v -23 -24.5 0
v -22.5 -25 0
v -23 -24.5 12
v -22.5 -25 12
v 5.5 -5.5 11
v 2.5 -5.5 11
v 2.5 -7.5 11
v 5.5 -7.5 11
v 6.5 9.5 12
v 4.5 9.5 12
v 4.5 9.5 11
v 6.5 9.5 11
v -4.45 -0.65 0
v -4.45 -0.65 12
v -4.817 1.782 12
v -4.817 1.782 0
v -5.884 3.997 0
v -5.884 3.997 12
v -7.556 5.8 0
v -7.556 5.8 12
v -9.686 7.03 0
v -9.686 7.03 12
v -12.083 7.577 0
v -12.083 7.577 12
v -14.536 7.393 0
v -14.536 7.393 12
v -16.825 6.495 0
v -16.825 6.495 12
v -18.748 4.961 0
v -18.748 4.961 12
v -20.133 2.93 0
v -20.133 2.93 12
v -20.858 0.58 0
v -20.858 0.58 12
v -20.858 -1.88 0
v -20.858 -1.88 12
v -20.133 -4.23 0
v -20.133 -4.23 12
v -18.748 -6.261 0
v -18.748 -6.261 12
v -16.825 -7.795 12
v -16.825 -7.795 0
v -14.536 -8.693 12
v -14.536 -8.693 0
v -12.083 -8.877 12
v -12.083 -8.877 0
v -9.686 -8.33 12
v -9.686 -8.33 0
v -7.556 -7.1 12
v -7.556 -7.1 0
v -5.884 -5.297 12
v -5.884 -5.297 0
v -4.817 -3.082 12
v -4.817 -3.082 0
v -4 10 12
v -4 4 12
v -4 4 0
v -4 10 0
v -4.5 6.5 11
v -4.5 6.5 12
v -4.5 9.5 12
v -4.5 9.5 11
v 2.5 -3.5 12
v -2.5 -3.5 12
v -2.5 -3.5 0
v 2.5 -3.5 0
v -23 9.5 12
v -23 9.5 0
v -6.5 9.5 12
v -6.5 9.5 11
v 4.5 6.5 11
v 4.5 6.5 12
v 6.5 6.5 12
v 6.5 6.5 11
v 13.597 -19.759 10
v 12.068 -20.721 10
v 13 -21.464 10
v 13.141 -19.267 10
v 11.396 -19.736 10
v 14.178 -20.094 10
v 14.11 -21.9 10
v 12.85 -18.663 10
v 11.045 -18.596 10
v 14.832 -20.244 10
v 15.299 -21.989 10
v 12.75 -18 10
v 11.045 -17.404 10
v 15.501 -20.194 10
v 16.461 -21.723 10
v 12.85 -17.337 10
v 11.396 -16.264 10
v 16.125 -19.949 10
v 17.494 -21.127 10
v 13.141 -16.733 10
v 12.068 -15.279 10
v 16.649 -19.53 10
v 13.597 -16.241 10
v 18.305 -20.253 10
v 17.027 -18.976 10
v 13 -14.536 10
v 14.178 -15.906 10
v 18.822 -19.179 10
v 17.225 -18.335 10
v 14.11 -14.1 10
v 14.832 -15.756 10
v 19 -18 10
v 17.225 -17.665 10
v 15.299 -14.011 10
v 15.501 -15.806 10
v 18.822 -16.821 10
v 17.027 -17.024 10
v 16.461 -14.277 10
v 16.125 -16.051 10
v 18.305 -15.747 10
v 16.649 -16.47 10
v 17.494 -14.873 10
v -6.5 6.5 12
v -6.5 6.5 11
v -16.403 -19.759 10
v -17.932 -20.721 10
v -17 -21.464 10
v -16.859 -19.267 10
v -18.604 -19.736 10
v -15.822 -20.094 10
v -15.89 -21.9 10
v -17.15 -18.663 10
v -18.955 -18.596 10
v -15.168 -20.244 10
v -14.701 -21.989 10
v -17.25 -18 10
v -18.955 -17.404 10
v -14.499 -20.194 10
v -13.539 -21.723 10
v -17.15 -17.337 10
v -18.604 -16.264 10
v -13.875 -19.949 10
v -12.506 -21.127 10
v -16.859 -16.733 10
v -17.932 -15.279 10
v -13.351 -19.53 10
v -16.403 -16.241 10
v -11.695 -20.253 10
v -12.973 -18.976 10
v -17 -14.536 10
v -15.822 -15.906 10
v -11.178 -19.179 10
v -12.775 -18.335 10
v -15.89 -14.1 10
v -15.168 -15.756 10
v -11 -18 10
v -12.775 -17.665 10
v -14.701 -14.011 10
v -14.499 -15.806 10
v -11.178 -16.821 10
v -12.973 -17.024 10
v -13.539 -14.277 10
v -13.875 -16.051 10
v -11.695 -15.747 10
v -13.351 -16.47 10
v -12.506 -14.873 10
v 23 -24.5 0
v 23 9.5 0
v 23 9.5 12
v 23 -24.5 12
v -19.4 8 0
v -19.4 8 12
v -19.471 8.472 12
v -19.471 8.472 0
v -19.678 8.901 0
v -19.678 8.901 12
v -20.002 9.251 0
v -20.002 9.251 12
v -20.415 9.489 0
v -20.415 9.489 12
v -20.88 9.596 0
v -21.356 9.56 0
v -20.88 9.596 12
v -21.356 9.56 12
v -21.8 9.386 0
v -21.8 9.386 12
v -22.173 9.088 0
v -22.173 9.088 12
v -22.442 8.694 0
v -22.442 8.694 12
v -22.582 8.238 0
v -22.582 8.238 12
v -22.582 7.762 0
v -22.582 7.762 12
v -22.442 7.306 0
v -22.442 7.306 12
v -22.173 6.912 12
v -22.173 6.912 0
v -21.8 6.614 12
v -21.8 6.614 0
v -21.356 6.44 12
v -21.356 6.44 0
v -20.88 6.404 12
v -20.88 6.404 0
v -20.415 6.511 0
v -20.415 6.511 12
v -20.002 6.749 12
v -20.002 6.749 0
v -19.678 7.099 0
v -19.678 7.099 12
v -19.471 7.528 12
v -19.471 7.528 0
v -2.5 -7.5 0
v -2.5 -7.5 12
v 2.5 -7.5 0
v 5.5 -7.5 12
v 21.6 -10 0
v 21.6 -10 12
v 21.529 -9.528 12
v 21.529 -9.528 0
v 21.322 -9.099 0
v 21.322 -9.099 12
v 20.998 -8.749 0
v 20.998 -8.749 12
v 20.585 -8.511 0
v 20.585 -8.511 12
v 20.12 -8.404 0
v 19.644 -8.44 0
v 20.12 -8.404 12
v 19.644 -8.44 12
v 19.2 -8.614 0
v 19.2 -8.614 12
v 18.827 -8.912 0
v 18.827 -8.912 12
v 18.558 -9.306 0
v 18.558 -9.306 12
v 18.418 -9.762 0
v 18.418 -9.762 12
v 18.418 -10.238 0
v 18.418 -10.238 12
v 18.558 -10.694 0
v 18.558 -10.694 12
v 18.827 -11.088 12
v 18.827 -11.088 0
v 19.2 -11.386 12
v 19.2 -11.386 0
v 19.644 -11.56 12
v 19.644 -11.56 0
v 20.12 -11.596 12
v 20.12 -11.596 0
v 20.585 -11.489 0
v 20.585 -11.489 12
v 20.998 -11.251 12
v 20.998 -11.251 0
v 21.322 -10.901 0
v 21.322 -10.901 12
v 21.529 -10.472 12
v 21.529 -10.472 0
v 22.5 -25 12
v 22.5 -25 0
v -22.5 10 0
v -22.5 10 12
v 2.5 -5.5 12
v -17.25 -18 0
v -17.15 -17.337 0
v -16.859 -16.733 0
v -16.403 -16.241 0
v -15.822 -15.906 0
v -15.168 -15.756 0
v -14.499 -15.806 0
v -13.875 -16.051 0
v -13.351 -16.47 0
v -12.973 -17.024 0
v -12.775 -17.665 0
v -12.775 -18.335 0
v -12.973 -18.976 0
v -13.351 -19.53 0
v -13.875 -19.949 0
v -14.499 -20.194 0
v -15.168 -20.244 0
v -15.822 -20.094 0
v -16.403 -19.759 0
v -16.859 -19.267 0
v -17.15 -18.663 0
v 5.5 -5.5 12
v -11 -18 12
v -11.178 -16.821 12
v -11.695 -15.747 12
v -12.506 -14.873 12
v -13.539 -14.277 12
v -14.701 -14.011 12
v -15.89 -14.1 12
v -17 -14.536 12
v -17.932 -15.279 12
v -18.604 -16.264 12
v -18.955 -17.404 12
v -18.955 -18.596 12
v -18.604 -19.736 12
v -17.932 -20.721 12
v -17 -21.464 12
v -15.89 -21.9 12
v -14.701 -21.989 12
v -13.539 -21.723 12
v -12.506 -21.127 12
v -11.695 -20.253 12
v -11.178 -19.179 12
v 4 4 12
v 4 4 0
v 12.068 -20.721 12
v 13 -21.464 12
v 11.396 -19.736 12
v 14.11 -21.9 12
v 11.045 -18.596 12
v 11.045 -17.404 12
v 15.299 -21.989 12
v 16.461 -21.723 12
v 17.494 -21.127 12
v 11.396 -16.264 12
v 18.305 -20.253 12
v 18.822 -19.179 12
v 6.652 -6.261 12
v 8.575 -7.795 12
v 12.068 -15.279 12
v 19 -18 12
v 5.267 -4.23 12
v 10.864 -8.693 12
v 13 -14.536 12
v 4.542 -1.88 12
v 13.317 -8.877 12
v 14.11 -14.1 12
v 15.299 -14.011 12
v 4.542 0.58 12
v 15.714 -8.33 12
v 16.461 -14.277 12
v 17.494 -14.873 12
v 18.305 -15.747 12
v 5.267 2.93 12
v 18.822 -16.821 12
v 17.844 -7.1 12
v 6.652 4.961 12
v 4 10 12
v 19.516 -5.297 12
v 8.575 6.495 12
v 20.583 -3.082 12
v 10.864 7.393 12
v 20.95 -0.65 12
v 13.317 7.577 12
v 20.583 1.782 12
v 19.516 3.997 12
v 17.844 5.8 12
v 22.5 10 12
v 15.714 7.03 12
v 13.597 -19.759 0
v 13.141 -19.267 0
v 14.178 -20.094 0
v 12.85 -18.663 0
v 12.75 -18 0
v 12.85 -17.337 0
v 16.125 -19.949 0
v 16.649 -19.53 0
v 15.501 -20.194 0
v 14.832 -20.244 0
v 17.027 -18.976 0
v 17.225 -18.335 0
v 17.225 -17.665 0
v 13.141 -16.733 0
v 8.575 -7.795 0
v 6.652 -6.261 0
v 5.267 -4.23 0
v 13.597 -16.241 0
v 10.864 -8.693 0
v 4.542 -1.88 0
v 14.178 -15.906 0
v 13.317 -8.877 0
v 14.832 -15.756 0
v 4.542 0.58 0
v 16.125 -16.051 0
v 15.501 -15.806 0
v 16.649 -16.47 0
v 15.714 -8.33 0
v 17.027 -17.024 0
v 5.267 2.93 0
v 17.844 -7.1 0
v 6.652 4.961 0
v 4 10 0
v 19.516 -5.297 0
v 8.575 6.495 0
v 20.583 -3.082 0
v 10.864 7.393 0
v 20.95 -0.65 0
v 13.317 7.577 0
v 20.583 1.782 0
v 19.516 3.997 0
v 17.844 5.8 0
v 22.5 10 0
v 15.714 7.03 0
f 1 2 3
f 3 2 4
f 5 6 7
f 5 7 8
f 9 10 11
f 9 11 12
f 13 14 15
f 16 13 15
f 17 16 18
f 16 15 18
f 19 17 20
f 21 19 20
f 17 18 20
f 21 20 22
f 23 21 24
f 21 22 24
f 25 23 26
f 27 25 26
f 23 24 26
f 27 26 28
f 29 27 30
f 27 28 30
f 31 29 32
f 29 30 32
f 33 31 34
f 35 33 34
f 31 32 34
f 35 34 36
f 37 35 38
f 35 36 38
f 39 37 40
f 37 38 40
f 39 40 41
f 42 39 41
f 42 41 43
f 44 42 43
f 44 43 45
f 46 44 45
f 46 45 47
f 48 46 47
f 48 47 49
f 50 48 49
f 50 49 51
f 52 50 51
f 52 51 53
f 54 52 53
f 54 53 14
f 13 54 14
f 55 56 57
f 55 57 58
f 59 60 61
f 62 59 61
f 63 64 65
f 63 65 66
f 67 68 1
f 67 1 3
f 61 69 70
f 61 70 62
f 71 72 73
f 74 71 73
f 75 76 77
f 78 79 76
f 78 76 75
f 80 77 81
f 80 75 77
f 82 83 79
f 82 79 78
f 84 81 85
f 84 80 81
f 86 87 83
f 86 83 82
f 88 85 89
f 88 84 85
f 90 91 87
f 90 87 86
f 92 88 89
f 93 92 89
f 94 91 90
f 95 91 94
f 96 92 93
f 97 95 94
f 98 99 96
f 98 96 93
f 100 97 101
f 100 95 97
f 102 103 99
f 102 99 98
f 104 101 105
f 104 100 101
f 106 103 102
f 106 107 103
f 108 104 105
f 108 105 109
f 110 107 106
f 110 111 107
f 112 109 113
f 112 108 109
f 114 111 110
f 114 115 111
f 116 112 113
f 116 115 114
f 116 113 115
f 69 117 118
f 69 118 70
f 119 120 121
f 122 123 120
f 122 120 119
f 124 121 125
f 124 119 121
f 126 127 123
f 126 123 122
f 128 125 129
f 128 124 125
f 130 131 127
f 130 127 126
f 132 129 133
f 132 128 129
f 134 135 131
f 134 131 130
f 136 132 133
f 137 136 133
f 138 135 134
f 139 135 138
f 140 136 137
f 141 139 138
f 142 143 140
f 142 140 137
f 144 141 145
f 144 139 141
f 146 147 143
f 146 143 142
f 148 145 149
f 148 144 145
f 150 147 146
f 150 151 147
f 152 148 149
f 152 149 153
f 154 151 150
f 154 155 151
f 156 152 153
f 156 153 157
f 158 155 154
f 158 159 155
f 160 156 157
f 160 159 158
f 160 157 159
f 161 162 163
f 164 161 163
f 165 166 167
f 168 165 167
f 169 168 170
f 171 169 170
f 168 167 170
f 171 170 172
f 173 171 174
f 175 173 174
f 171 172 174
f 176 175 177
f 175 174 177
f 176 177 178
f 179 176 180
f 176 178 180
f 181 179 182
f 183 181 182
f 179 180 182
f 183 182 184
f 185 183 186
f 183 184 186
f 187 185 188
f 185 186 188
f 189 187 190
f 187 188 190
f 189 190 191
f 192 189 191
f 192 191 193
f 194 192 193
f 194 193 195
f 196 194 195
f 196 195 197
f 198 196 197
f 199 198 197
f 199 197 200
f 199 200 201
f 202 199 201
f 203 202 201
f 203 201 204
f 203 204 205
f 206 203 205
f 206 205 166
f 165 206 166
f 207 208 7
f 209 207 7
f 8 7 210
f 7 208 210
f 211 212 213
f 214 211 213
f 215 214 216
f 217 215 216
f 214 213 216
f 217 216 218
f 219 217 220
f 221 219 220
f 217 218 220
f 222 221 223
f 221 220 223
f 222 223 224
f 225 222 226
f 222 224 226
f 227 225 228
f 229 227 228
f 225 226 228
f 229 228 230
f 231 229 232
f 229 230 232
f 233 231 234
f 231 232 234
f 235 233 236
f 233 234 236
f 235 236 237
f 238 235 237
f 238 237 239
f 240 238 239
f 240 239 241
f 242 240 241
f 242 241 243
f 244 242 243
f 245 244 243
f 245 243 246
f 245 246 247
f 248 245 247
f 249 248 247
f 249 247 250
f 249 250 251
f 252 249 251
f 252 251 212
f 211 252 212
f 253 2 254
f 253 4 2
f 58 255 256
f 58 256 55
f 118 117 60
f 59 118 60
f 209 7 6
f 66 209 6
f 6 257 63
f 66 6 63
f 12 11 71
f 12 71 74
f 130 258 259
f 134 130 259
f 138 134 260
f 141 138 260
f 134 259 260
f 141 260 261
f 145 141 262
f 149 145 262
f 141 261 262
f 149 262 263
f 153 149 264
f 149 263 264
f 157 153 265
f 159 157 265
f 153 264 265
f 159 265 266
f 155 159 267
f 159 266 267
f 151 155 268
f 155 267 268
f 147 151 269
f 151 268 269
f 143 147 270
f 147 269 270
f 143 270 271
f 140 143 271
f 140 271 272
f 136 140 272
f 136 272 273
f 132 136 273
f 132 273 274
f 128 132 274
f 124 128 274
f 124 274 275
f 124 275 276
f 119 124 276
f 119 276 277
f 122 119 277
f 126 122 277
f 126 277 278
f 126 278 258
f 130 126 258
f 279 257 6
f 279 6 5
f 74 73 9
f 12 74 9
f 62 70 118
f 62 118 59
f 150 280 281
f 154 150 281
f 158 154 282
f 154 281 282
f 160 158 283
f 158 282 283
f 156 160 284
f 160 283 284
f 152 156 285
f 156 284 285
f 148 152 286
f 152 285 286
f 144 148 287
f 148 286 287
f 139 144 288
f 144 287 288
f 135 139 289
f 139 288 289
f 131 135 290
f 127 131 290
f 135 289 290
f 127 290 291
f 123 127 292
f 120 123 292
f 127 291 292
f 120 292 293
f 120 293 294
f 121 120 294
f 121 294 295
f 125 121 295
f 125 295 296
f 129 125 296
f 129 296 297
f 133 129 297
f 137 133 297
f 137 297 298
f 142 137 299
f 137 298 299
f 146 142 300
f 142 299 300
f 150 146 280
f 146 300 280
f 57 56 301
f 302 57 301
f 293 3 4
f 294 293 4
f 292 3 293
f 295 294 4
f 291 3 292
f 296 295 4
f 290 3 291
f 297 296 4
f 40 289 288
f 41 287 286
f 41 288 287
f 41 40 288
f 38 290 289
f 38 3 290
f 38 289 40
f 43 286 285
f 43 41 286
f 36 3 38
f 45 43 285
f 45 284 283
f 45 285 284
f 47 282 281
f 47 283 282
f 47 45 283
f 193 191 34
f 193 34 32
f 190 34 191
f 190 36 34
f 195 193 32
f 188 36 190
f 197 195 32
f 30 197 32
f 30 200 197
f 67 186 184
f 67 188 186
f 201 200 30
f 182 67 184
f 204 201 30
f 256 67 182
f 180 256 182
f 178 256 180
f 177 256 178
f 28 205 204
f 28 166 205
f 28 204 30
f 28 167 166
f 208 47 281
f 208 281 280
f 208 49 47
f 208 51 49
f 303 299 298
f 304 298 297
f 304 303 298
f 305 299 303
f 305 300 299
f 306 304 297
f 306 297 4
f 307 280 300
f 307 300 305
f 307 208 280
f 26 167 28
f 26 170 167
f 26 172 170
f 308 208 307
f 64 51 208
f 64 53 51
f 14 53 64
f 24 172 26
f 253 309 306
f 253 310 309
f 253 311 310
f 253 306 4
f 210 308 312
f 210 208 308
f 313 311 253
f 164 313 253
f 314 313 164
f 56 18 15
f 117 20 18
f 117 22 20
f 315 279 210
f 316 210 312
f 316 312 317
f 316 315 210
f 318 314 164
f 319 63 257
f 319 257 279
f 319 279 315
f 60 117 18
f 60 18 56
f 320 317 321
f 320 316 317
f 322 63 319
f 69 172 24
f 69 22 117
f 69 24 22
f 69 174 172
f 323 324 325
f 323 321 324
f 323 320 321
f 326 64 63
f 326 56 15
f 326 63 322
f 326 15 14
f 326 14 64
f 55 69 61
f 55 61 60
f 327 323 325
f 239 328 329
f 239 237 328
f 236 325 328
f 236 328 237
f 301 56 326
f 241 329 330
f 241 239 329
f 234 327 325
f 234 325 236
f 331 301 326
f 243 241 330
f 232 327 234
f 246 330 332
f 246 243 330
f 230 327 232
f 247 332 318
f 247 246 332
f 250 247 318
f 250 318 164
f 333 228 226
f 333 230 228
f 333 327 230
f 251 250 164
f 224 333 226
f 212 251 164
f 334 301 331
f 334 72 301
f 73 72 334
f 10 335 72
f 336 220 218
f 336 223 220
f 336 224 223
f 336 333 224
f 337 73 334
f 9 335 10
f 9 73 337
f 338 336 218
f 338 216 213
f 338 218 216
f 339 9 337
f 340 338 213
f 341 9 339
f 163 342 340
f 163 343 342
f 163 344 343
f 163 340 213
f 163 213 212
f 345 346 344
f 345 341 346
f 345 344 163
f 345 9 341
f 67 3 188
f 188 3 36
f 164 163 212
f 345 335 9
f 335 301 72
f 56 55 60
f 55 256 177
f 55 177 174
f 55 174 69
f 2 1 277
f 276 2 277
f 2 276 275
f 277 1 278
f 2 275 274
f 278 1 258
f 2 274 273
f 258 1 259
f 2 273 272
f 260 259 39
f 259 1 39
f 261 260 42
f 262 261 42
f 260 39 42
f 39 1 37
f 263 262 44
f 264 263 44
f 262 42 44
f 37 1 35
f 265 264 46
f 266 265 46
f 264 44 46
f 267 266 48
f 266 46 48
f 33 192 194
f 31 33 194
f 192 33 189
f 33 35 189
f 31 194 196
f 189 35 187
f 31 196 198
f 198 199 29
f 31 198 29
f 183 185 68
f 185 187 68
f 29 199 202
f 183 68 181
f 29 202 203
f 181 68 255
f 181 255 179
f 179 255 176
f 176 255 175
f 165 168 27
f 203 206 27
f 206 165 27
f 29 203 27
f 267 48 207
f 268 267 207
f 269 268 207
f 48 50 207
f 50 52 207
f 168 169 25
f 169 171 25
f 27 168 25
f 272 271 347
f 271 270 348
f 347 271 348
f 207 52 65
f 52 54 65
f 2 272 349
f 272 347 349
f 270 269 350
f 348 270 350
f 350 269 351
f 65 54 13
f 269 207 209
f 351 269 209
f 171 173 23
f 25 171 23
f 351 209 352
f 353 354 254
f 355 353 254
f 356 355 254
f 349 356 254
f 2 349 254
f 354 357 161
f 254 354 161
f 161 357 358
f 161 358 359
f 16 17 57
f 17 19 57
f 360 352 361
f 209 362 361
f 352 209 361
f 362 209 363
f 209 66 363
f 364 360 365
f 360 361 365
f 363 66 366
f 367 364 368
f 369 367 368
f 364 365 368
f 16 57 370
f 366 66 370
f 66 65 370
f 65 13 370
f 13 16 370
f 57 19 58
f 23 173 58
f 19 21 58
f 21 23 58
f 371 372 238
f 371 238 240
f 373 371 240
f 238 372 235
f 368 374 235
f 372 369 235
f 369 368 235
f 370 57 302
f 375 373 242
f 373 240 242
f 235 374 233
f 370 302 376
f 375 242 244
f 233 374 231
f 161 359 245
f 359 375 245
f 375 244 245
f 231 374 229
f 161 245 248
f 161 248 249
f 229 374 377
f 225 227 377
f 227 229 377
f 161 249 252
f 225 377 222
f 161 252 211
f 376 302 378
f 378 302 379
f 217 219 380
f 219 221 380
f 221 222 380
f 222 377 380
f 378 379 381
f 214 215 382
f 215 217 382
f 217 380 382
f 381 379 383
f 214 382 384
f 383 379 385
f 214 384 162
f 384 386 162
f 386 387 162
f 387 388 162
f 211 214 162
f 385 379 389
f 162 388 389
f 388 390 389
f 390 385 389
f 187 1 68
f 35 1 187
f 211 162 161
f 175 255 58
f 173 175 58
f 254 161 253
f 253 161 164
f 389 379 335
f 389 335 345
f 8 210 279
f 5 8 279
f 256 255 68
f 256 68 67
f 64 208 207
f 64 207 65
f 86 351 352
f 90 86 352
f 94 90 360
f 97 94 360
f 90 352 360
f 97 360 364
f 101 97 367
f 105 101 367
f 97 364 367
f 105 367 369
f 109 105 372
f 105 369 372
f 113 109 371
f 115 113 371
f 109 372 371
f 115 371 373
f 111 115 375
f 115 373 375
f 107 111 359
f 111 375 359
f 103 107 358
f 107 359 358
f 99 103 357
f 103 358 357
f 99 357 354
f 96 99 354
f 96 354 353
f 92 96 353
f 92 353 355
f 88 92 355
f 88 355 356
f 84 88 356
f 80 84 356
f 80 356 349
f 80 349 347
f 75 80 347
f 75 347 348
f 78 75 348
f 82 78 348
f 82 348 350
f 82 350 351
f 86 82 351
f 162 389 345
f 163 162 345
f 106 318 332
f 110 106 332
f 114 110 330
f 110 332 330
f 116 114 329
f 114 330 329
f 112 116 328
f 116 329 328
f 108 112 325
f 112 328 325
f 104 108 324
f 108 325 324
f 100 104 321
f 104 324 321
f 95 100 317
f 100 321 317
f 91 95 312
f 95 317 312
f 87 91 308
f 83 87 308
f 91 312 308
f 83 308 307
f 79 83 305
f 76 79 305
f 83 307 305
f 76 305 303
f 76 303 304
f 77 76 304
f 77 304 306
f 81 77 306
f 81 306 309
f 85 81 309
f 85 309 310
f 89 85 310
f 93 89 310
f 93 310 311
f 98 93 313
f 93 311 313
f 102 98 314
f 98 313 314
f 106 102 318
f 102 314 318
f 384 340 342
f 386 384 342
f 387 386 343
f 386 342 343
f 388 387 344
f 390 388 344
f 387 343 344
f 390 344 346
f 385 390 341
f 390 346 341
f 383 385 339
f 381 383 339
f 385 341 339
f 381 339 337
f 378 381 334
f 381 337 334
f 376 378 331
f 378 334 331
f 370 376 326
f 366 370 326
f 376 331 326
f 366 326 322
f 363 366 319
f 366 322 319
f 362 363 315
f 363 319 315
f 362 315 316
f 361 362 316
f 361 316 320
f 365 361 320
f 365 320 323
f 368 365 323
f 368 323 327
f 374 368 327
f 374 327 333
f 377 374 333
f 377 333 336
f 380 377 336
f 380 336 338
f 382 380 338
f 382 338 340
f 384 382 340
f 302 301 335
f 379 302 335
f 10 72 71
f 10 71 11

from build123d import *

# Parameters (mm, degrees)
SKETCH_1_W           = 46
SKETCH_1_H           = 20
EXTRUDE_1_DEPTH      = 12
SKETCH_2_R           = 8.25
CUT_EXTRUDE_1_DEPTH  = 13
SKETCH_3_W           = 8
SKETCH_3_H           = 6
CUT_EXTRUDE_2_DEPTH  = 13
SKETCH_4_W           = 5
SKETCH_4_H           = 4
CUT_EXTRUDE_3_DEPTH  = 13
SKETCH_5_W           = 3
SKETCH_5_H           = 2
SKETCH_5_W_2         = 2
SKETCH_5_H_2         = 3
CUT_EXTRUDE_4_DEPTH  = 1
SKETCH_6_W           = 46
SKETCH_6_H           = 12
EXTRUDE_2_DEPTH      = 15
SKETCH_14_R          = 1.6
CUT_EXTRUDE_10_DEPTH = 46
SKETCH_15_R          = 2.25
CUT_EXTRUDE_11_DEPTH = 13
SKETCH1_R            = 1.6
CUT_EXTRUDE1_DEPTH   = 13
SKETCH2_R            = 4
CUT_EXTRUDE2_DEPTH   = 2
CHAMFER1_SIZE        = 0.5
CHAMFER2_SIZE        = 0.5


with BuildPart() as part:
    # 草圖1 → 填料-伸長1 (new body)
    with BuildSketch(Plane.XY):
        Rectangle(SKETCH_1_W, SKETCH_1_H)
    extrude(amount=EXTRUDE_1_DEPTH)

    # 草圖2 → 除料-伸長1 (cut, through all)
    with BuildSketch(Plane.XY.offset(12)):
        with Locations((-12.7, -0.65)):
            Circle(SKETCH_2_R)
        with Locations((12.7, -0.65)):
            Circle(SKETCH_2_R)
    extrude(amount=-CUT_EXTRUDE_1_DEPTH, mode=Mode.SUBTRACT)

    # 草圖3 → 除料-伸長2 (cut, through all)
    with BuildSketch(Plane.XY.offset(12)):
        with Locations((0, 7)):
            Rectangle(SKETCH_3_W, SKETCH_3_H)
    extrude(amount=-CUT_EXTRUDE_2_DEPTH, mode=Mode.SUBTRACT)

    # 草圖4 → 除料-伸長3 (cut, through all)
    with BuildSketch(Plane.XY.offset(12)):
        with Locations((0, -5.5)):
            Rectangle(SKETCH_4_W, SKETCH_4_H)
    extrude(amount=-CUT_EXTRUDE_3_DEPTH, mode=Mode.SUBTRACT)

    # 草圖5 → 除料-伸長4 (cut)
    with BuildSketch(Plane.XY.offset(12)):
        with Locations((4, -6.5)):
            Rectangle(SKETCH_5_W, SKETCH_5_H)
        with Locations((-5.5, 8)):
            Rectangle(SKETCH_5_W_2, SKETCH_5_H_2)
        with Locations((5.5, 8)):
            Rectangle(SKETCH_5_W_2, SKETCH_5_H_2)
    extrude(amount=-CUT_EXTRUDE_4_DEPTH, mode=Mode.SUBTRACT)

    # 草圖6 → 填料-伸長2 (add)
    with BuildSketch(Plane.XZ.offset(10)):
        with Locations((0, 6)):
            Rectangle(SKETCH_6_W, SKETCH_6_H)
    extrude(amount=EXTRUDE_2_DEPTH)

    # 草圖14 → 除料-伸長10 (cut)
    with BuildSketch(Plane.XY.offset(12)):
        with Locations((-21, 8)):
            Circle(SKETCH_14_R)
    extrude(amount=-CUT_EXTRUDE_10_DEPTH, mode=Mode.SUBTRACT)

    # 草圖15 → 除料-伸長11 (cut, through all)
    with BuildSketch(Plane(origin=(0, 0, 0), x_dir=(-1, 0, 0), z_dir=(0, 0, -1))):
        with Locations((-15, -18)):
            Circle(SKETCH_15_R)
        with Locations((15, -18)):
            Circle(SKETCH_15_R)
    extrude(amount=-CUT_EXTRUDE_11_DEPTH, mode=Mode.SUBTRACT)

    # Sketch1 → Cut-Extrude1 (cut, through all)
    with BuildSketch(Plane.XY.offset(12)):
        with Locations((20, -10)):
            Circle(SKETCH1_R)
    extrude(amount=-CUT_EXTRUDE1_DEPTH, mode=Mode.SUBTRACT)

    # Sketch2 → Cut-Extrude2 (cut)
    with BuildSketch(Plane.XY.offset(12)):
        with Locations((-15, -18)):
            Circle(SKETCH2_R)
        with Locations((15, -18)):
            Circle(SKETCH2_R)
    extrude(amount=-CUT_EXTRUDE2_DEPTH, mode=Mode.SUBTRACT)

    # Chamfer1
    chamfer1_edges = [part.edges().sort_by_distance(p)[0] for p in [
        (-23, 10, 6),
        (23, 10, 6),
    ]]
    chamfer(chamfer1_edges, length=CHAMFER1_SIZE)

    # Chamfer2
    chamfer2_edges = [part.edges().sort_by_distance(p)[0] for p in [
        (-23, -25, 6),
        (23, -25, 6),
    ]]
    chamfer(chamfer2_edges, length=CHAMFER2_SIZE)


solid = part.part
